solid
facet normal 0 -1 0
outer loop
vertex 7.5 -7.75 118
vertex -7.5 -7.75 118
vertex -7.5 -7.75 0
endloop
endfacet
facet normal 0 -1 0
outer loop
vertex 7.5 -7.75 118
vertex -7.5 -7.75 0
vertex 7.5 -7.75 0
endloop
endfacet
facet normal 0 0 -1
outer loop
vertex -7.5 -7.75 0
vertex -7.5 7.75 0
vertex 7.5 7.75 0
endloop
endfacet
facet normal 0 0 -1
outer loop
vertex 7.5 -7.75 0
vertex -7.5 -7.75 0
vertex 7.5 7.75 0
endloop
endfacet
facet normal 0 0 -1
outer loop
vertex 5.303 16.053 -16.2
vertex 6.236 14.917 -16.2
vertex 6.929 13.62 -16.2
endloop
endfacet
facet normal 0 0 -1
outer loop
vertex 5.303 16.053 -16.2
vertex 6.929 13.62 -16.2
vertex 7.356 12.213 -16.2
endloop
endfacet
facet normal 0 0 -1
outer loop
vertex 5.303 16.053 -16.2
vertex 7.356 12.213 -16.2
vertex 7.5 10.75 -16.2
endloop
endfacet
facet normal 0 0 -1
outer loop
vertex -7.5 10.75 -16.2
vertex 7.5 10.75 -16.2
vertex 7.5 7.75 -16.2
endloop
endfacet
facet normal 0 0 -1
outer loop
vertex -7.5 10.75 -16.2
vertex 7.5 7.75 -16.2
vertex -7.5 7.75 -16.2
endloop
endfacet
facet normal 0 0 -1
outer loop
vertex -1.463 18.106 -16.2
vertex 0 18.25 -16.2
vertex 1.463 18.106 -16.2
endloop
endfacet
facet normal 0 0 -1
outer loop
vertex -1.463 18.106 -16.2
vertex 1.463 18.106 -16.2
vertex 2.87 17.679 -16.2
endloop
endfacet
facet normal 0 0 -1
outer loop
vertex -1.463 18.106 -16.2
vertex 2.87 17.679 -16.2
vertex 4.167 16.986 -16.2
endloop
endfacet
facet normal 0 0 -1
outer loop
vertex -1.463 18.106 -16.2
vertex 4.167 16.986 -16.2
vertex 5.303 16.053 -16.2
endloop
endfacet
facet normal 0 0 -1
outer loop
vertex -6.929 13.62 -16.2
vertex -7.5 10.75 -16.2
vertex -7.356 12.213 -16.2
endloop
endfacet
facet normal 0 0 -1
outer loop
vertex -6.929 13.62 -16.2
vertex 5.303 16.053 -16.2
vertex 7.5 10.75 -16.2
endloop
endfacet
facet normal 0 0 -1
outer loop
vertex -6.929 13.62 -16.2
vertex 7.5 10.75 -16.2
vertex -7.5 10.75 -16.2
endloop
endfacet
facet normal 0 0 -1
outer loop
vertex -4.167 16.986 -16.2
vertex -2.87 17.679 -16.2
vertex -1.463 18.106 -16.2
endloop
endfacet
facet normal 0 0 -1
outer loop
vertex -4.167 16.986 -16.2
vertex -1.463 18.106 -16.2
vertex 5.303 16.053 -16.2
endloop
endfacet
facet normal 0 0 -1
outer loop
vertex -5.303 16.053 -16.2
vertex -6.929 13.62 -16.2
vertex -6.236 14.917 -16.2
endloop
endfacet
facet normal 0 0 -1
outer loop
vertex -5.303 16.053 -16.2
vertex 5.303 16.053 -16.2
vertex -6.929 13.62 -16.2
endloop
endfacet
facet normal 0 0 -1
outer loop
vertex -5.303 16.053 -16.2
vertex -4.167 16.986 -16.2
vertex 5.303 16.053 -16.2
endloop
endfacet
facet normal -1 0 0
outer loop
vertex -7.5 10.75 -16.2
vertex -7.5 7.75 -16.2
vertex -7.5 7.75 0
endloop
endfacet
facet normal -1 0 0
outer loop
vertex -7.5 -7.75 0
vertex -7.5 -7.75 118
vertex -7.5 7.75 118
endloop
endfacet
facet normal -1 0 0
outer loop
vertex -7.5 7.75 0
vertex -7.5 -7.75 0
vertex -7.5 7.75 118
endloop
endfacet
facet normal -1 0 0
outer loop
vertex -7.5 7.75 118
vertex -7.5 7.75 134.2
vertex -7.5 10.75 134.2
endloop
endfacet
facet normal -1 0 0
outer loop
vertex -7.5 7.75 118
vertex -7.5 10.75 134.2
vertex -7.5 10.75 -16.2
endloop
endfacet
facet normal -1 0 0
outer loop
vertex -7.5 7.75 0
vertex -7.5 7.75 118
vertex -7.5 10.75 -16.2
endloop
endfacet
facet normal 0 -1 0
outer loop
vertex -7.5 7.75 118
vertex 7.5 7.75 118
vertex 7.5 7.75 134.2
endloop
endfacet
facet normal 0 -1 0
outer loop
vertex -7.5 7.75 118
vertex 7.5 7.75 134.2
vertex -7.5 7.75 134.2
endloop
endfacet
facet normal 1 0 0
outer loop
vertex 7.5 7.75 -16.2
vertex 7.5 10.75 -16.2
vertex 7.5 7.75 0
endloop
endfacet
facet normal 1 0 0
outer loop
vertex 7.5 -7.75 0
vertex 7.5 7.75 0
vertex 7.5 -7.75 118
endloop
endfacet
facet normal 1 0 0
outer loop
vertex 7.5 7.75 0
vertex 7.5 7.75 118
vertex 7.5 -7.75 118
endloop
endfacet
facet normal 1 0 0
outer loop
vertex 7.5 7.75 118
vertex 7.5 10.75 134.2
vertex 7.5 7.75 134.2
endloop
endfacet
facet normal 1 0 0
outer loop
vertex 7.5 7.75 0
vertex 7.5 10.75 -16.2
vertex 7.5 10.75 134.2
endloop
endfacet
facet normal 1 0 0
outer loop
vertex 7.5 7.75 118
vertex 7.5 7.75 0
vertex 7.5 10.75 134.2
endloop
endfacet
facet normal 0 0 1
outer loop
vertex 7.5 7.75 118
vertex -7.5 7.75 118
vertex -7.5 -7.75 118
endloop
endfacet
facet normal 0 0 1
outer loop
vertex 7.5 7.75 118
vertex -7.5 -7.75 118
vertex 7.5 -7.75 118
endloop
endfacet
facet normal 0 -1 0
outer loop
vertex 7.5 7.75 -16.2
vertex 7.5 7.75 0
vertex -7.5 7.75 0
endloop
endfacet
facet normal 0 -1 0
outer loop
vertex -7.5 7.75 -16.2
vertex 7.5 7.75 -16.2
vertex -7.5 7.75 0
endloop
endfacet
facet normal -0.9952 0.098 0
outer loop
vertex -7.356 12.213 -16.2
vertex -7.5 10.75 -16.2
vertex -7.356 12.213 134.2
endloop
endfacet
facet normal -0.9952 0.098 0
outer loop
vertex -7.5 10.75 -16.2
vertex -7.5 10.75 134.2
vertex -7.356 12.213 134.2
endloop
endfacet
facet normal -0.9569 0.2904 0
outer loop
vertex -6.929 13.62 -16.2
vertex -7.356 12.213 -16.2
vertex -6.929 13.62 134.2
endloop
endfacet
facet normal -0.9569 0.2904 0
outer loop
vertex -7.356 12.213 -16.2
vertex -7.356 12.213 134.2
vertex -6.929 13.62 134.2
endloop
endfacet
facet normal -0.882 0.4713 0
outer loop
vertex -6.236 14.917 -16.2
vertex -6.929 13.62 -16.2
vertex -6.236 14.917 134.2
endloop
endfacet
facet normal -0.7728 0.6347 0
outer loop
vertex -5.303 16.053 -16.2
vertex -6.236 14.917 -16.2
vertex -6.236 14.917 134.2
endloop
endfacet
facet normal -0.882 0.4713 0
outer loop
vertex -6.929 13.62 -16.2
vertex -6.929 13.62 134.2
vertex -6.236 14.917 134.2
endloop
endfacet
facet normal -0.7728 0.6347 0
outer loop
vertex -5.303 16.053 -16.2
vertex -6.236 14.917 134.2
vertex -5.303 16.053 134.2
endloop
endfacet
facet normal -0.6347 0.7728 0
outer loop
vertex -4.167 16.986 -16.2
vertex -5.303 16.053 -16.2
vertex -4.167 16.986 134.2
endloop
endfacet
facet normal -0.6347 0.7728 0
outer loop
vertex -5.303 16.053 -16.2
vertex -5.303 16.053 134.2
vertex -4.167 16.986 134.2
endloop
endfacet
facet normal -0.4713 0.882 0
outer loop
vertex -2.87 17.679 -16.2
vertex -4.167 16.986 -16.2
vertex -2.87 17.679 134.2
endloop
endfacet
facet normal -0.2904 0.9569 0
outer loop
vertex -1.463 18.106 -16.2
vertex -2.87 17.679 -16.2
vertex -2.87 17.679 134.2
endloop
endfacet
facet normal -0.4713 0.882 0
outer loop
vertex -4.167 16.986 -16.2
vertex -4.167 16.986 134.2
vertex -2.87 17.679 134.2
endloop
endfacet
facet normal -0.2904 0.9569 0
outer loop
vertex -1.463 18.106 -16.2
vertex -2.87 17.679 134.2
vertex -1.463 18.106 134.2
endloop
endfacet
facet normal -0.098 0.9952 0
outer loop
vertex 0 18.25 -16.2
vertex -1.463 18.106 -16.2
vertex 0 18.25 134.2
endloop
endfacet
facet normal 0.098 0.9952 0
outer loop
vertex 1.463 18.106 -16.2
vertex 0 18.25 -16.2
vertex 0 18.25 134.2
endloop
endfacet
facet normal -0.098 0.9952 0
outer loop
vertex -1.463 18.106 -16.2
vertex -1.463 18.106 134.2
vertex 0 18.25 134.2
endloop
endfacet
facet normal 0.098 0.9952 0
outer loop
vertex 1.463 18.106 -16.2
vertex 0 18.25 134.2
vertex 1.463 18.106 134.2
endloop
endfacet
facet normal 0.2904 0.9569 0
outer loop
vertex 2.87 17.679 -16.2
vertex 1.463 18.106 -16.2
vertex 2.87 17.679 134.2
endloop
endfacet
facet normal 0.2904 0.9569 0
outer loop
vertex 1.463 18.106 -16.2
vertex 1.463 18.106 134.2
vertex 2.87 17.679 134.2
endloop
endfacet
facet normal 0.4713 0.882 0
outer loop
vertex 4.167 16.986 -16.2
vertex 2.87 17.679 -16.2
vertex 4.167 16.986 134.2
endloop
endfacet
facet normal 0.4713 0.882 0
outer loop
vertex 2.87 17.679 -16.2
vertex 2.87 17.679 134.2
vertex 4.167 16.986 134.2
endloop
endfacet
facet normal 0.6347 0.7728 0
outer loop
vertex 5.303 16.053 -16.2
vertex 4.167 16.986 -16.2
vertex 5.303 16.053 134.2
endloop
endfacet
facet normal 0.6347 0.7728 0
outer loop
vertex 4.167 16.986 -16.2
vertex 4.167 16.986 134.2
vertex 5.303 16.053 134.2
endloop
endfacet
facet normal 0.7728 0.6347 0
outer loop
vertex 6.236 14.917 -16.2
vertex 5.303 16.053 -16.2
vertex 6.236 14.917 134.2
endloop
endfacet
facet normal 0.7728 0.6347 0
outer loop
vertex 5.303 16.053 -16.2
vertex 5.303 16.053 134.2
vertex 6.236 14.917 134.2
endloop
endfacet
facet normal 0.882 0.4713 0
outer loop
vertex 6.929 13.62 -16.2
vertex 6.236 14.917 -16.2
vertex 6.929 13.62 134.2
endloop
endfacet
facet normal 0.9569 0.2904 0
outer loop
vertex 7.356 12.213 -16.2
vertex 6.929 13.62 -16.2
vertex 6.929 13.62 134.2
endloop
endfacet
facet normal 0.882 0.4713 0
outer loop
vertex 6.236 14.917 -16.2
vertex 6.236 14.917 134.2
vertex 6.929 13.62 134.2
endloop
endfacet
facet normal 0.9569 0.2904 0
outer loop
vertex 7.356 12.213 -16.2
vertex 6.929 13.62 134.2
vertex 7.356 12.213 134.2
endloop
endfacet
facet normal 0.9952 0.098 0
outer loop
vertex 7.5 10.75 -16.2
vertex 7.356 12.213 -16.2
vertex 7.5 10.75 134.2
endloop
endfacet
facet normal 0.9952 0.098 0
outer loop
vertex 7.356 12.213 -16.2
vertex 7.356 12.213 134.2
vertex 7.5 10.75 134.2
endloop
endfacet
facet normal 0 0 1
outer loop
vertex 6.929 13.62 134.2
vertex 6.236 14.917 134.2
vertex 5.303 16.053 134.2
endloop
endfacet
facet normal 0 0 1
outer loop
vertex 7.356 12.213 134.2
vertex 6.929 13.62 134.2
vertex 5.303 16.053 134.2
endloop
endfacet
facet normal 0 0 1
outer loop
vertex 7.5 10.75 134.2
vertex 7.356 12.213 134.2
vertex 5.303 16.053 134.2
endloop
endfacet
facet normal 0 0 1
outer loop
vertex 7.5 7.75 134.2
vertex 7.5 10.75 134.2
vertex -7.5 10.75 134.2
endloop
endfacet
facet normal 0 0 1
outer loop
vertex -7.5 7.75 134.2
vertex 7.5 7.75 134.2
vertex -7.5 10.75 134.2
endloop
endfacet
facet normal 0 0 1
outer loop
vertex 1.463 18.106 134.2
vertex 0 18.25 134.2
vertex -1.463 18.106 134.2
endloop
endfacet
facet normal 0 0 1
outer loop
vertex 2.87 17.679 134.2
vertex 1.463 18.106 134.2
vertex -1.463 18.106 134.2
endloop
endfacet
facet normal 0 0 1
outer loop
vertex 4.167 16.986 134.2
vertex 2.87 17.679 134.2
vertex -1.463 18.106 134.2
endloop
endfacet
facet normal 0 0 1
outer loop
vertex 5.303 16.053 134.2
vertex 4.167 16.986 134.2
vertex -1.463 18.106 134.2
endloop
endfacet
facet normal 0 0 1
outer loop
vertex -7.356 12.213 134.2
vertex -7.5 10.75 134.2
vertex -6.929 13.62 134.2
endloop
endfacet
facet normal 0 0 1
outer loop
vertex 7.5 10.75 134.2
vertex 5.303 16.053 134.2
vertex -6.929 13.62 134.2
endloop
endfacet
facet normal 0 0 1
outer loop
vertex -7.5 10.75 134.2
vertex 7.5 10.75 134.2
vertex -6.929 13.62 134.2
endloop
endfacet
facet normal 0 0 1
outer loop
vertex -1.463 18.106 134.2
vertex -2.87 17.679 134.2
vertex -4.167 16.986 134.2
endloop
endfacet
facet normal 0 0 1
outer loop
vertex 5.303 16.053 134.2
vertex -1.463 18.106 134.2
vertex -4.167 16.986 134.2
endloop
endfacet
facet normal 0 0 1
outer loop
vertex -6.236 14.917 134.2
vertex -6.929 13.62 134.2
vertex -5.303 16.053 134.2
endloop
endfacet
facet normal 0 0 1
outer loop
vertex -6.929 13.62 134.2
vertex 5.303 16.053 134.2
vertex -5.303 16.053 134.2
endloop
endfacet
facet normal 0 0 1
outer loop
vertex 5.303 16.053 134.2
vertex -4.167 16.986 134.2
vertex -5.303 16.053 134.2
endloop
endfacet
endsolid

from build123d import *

# Parameters (mm, degrees)
SKETCH1_W                = 15
SKETCH1_H                = 15.5
BOSS_EXTRUDE1_DEPTH      = 118
BOSS_EXTRUDE2_DEPTH      = 16.2
BOSS_EXTRUDE2_DEPTH_BACK = 134.2


with BuildPart() as part:
    # Sketch1 → Boss-Extrude1 (new body)
    with BuildSketch(Plane.XY):
        Rectangle(SKETCH1_W, SKETCH1_H)
    extrude(amount=BOSS_EXTRUDE1_DEPTH)

    # Sketch2 → Boss-Extrude2 (add, two sides)
    with BuildSketch(Plane.XY.offset(118)) as boss_extrude2_sk:
        with BuildLine():
            Line((-7.5, 7.75), (-7.5, 10.75))
            ThreePointArc((-7.5, 10.75), (0, 18.25), (7.5, 10.75))
            Line((7.5, 10.75), (7.5, 7.75))
            Line((7.5, 7.75), (-7.5, 7.75))
        make_face()
    extrude(amount=BOSS_EXTRUDE2_DEPTH)
    extrude(boss_extrude2_sk.sketch, amount=-BOSS_EXTRUDE2_DEPTH_BACK)


solid = part.part
